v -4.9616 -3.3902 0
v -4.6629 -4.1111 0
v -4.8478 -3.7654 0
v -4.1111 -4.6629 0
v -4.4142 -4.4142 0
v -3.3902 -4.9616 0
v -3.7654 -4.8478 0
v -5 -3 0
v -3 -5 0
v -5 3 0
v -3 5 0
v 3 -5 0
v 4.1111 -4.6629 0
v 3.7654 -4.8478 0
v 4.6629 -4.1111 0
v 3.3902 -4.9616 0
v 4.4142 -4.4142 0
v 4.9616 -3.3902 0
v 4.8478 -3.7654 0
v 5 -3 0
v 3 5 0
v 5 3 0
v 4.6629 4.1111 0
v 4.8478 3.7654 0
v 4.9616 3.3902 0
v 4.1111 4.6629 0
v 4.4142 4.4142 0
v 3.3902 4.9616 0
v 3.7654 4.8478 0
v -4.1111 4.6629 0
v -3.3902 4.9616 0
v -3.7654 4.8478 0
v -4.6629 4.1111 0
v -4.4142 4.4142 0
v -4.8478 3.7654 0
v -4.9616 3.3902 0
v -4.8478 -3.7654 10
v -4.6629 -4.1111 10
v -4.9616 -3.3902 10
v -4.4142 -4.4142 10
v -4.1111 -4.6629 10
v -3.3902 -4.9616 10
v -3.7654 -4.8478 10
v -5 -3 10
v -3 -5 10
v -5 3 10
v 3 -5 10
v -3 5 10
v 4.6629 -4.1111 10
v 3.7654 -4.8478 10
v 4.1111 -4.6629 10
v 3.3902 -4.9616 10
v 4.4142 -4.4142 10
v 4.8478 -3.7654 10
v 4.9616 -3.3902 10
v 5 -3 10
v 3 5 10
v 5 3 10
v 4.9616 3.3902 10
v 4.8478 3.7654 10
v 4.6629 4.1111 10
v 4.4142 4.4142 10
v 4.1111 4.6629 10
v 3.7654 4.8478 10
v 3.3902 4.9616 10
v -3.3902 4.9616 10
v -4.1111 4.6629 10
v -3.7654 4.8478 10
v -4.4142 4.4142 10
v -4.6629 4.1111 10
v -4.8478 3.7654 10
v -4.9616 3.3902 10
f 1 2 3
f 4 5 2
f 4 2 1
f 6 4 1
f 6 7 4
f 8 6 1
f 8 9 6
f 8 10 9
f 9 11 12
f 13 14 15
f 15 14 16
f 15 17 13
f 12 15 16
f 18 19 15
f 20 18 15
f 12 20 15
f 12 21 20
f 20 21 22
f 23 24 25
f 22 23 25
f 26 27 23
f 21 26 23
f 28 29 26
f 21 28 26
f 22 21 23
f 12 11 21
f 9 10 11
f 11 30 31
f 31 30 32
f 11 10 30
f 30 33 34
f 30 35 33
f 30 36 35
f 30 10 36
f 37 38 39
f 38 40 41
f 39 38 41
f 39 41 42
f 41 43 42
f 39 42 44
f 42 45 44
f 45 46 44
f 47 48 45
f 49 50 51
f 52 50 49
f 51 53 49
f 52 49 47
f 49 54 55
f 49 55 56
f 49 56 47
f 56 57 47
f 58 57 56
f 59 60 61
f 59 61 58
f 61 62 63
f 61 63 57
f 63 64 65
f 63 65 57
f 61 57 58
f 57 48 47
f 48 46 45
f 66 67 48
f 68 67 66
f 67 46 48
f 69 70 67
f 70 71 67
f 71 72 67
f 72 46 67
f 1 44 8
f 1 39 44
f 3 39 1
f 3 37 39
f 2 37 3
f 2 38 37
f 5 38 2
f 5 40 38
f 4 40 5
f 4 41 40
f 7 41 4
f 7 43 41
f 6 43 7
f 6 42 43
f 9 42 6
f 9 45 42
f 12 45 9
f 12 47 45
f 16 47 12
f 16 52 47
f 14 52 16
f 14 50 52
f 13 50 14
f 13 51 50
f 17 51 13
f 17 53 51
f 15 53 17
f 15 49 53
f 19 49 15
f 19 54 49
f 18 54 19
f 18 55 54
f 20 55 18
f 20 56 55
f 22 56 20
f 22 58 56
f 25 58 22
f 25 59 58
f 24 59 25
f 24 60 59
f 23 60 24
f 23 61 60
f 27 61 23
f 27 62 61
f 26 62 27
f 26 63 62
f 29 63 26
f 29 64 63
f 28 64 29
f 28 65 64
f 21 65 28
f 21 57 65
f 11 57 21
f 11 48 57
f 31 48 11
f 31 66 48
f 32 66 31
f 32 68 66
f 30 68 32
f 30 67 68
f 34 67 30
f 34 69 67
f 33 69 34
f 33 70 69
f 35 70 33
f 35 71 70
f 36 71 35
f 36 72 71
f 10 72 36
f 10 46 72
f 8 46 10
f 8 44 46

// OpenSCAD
translate(v = [-5.0000000000, -5.0000000000, 0]) {
	linear_extrude(height = 10) {
		hull() {
			translate(v = [2, 2, 0]) {
				circle($fn = 32, r = 2);
			}
			translate(v = [8, 2, 0]) {
				circle($fn = 32, r = 2);
			}
			translate(v = [8, 8, 0]) {
				circle($fn = 32, r = 2);
			}
			translate(v = [2, 8, 0]) {
				circle($fn = 32, r = 2);
			}
		}
	}
}
